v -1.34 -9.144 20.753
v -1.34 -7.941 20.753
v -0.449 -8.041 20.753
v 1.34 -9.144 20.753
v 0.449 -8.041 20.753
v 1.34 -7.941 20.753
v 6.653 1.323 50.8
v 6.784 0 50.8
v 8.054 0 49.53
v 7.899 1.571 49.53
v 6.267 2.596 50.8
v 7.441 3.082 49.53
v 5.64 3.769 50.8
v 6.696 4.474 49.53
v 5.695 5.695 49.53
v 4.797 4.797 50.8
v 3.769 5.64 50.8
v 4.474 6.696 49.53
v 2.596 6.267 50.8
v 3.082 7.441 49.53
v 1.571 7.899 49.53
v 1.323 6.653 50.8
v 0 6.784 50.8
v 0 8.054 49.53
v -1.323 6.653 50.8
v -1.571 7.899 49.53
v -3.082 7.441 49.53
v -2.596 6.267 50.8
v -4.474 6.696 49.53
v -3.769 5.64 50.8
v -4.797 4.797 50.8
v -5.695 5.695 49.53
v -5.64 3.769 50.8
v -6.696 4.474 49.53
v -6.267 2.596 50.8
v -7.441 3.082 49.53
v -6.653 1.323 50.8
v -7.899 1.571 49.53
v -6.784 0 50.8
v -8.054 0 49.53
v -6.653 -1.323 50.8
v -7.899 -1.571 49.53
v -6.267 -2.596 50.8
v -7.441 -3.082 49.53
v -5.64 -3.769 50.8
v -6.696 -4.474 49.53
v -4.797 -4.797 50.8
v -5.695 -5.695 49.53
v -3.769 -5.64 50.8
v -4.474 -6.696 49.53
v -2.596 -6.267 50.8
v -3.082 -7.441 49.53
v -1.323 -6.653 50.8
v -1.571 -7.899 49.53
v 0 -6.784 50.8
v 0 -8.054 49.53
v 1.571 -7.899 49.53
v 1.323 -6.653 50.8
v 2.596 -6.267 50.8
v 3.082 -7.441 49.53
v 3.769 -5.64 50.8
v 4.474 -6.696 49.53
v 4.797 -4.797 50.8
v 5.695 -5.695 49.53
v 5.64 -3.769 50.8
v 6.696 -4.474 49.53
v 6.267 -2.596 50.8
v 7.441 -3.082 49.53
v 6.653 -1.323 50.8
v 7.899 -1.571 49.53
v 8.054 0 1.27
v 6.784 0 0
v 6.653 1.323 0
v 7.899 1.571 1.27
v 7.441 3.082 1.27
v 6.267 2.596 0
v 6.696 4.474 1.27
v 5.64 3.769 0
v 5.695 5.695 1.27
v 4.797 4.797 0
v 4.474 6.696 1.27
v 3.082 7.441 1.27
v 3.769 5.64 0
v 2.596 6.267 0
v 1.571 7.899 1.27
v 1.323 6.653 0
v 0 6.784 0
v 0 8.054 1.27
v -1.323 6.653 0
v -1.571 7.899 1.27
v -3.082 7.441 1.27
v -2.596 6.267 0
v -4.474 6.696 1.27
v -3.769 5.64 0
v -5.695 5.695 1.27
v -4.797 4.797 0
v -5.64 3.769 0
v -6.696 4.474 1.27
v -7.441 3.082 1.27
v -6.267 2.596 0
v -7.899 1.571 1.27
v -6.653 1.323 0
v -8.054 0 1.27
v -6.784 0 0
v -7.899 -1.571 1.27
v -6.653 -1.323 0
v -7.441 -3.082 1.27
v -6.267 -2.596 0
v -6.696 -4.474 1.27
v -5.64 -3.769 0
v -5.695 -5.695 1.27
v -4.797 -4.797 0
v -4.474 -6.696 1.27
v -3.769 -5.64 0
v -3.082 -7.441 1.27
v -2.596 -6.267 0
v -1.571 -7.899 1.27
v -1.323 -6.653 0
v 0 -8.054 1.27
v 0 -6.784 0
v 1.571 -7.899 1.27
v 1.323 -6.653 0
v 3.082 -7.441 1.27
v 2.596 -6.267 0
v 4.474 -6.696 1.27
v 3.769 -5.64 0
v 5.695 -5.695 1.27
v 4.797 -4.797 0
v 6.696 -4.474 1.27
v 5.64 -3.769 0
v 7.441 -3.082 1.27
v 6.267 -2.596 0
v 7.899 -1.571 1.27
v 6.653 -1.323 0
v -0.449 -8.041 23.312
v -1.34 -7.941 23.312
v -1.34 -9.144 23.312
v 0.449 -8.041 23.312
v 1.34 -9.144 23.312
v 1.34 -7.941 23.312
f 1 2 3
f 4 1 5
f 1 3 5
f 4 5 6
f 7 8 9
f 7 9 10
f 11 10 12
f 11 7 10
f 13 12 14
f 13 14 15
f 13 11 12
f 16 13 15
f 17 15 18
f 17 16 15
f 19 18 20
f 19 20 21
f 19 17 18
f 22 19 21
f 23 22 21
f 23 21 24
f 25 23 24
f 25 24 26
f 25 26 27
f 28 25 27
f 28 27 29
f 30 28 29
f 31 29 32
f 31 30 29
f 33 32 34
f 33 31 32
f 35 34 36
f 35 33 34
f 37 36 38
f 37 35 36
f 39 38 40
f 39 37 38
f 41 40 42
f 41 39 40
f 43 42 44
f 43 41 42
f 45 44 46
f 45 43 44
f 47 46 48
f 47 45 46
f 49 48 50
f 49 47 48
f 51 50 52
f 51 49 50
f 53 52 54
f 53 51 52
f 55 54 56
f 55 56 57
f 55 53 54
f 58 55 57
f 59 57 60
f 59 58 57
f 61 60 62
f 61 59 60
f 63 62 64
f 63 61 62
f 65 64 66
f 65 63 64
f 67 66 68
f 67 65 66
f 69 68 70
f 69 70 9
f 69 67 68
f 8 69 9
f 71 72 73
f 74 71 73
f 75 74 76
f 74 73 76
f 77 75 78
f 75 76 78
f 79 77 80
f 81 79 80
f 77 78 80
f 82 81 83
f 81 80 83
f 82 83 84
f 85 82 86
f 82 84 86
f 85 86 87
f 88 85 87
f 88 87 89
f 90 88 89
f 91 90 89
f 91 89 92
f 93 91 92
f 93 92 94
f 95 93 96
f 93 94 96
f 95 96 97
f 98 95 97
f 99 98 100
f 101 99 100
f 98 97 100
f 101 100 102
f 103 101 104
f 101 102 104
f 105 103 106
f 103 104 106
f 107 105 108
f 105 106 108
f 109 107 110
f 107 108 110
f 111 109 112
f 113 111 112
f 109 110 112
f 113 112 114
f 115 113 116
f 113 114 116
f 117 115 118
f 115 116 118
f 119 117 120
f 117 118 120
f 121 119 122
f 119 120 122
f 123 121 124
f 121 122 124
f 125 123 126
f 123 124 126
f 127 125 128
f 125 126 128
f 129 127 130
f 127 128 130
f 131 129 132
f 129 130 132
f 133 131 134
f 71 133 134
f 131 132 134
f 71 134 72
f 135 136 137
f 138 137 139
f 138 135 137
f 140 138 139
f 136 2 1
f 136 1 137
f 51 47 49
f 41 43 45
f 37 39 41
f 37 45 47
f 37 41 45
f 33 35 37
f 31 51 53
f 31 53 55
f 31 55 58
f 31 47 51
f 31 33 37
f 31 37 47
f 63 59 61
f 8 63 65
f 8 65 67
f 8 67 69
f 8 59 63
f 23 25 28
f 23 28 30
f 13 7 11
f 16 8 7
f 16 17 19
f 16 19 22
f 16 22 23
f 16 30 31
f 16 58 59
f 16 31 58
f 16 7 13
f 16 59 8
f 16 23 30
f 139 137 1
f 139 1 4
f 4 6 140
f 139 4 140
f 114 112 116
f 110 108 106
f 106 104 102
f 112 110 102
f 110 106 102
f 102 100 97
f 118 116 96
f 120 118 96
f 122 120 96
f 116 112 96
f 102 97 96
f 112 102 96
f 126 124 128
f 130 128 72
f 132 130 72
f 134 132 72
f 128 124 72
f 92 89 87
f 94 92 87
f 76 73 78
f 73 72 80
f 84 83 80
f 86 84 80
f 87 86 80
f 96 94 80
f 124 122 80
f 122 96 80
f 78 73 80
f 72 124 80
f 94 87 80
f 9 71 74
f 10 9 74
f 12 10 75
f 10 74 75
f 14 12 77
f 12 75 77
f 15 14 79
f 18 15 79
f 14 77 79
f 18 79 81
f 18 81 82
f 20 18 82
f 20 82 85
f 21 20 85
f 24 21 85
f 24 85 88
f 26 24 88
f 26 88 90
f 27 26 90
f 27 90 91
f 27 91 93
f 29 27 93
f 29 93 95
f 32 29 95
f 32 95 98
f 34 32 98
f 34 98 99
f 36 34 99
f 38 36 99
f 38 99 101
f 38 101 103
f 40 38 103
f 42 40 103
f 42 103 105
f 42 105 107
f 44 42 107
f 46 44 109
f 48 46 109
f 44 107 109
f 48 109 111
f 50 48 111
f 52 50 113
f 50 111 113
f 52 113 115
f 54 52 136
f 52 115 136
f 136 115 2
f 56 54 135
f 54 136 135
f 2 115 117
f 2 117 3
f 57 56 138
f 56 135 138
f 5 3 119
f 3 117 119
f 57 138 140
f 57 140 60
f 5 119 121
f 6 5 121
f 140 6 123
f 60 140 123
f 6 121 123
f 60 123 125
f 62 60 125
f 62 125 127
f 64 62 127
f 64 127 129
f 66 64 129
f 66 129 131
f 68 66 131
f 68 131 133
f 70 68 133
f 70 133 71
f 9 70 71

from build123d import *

# Parameters (mm, degrees)
F0_R     = 8.053641
F1_DEPTH = 50.8
F2_SIZE  = 1.27
F3_SIZE  = 1.27
F4_W     = 2.679992
F4_H     = 2.559151
F5_DEPTH = 9.144


with BuildPart() as f1:
    # F0 (on Top) → F1 (new body)
    with BuildSketch(Plane.XY):
        Circle(F0_R)
    extrude(amount=F1_DEPTH)

    # F2
    f2_edges = [f1.edges().sort_by_distance(p)[0] for p in [
        (-8.053641, 0, 50.8),
    ]]
    chamfer(f2_edges, length=F2_SIZE)

    # F3
    f3_edges = [f1.edges().sort_by_distance(p)[0] for p in [
        (-8.053641, 0, 0),
    ]]
    chamfer(f3_edges, length=F3_SIZE)

    # F4 (on Front) → F5 (join)
    with BuildSketch(Plane.XZ):
        with Locations((0, 22.032296)):
            Rectangle(F4_W, F4_H)
    extrude(amount=F5_DEPTH)


solid = f1.part
